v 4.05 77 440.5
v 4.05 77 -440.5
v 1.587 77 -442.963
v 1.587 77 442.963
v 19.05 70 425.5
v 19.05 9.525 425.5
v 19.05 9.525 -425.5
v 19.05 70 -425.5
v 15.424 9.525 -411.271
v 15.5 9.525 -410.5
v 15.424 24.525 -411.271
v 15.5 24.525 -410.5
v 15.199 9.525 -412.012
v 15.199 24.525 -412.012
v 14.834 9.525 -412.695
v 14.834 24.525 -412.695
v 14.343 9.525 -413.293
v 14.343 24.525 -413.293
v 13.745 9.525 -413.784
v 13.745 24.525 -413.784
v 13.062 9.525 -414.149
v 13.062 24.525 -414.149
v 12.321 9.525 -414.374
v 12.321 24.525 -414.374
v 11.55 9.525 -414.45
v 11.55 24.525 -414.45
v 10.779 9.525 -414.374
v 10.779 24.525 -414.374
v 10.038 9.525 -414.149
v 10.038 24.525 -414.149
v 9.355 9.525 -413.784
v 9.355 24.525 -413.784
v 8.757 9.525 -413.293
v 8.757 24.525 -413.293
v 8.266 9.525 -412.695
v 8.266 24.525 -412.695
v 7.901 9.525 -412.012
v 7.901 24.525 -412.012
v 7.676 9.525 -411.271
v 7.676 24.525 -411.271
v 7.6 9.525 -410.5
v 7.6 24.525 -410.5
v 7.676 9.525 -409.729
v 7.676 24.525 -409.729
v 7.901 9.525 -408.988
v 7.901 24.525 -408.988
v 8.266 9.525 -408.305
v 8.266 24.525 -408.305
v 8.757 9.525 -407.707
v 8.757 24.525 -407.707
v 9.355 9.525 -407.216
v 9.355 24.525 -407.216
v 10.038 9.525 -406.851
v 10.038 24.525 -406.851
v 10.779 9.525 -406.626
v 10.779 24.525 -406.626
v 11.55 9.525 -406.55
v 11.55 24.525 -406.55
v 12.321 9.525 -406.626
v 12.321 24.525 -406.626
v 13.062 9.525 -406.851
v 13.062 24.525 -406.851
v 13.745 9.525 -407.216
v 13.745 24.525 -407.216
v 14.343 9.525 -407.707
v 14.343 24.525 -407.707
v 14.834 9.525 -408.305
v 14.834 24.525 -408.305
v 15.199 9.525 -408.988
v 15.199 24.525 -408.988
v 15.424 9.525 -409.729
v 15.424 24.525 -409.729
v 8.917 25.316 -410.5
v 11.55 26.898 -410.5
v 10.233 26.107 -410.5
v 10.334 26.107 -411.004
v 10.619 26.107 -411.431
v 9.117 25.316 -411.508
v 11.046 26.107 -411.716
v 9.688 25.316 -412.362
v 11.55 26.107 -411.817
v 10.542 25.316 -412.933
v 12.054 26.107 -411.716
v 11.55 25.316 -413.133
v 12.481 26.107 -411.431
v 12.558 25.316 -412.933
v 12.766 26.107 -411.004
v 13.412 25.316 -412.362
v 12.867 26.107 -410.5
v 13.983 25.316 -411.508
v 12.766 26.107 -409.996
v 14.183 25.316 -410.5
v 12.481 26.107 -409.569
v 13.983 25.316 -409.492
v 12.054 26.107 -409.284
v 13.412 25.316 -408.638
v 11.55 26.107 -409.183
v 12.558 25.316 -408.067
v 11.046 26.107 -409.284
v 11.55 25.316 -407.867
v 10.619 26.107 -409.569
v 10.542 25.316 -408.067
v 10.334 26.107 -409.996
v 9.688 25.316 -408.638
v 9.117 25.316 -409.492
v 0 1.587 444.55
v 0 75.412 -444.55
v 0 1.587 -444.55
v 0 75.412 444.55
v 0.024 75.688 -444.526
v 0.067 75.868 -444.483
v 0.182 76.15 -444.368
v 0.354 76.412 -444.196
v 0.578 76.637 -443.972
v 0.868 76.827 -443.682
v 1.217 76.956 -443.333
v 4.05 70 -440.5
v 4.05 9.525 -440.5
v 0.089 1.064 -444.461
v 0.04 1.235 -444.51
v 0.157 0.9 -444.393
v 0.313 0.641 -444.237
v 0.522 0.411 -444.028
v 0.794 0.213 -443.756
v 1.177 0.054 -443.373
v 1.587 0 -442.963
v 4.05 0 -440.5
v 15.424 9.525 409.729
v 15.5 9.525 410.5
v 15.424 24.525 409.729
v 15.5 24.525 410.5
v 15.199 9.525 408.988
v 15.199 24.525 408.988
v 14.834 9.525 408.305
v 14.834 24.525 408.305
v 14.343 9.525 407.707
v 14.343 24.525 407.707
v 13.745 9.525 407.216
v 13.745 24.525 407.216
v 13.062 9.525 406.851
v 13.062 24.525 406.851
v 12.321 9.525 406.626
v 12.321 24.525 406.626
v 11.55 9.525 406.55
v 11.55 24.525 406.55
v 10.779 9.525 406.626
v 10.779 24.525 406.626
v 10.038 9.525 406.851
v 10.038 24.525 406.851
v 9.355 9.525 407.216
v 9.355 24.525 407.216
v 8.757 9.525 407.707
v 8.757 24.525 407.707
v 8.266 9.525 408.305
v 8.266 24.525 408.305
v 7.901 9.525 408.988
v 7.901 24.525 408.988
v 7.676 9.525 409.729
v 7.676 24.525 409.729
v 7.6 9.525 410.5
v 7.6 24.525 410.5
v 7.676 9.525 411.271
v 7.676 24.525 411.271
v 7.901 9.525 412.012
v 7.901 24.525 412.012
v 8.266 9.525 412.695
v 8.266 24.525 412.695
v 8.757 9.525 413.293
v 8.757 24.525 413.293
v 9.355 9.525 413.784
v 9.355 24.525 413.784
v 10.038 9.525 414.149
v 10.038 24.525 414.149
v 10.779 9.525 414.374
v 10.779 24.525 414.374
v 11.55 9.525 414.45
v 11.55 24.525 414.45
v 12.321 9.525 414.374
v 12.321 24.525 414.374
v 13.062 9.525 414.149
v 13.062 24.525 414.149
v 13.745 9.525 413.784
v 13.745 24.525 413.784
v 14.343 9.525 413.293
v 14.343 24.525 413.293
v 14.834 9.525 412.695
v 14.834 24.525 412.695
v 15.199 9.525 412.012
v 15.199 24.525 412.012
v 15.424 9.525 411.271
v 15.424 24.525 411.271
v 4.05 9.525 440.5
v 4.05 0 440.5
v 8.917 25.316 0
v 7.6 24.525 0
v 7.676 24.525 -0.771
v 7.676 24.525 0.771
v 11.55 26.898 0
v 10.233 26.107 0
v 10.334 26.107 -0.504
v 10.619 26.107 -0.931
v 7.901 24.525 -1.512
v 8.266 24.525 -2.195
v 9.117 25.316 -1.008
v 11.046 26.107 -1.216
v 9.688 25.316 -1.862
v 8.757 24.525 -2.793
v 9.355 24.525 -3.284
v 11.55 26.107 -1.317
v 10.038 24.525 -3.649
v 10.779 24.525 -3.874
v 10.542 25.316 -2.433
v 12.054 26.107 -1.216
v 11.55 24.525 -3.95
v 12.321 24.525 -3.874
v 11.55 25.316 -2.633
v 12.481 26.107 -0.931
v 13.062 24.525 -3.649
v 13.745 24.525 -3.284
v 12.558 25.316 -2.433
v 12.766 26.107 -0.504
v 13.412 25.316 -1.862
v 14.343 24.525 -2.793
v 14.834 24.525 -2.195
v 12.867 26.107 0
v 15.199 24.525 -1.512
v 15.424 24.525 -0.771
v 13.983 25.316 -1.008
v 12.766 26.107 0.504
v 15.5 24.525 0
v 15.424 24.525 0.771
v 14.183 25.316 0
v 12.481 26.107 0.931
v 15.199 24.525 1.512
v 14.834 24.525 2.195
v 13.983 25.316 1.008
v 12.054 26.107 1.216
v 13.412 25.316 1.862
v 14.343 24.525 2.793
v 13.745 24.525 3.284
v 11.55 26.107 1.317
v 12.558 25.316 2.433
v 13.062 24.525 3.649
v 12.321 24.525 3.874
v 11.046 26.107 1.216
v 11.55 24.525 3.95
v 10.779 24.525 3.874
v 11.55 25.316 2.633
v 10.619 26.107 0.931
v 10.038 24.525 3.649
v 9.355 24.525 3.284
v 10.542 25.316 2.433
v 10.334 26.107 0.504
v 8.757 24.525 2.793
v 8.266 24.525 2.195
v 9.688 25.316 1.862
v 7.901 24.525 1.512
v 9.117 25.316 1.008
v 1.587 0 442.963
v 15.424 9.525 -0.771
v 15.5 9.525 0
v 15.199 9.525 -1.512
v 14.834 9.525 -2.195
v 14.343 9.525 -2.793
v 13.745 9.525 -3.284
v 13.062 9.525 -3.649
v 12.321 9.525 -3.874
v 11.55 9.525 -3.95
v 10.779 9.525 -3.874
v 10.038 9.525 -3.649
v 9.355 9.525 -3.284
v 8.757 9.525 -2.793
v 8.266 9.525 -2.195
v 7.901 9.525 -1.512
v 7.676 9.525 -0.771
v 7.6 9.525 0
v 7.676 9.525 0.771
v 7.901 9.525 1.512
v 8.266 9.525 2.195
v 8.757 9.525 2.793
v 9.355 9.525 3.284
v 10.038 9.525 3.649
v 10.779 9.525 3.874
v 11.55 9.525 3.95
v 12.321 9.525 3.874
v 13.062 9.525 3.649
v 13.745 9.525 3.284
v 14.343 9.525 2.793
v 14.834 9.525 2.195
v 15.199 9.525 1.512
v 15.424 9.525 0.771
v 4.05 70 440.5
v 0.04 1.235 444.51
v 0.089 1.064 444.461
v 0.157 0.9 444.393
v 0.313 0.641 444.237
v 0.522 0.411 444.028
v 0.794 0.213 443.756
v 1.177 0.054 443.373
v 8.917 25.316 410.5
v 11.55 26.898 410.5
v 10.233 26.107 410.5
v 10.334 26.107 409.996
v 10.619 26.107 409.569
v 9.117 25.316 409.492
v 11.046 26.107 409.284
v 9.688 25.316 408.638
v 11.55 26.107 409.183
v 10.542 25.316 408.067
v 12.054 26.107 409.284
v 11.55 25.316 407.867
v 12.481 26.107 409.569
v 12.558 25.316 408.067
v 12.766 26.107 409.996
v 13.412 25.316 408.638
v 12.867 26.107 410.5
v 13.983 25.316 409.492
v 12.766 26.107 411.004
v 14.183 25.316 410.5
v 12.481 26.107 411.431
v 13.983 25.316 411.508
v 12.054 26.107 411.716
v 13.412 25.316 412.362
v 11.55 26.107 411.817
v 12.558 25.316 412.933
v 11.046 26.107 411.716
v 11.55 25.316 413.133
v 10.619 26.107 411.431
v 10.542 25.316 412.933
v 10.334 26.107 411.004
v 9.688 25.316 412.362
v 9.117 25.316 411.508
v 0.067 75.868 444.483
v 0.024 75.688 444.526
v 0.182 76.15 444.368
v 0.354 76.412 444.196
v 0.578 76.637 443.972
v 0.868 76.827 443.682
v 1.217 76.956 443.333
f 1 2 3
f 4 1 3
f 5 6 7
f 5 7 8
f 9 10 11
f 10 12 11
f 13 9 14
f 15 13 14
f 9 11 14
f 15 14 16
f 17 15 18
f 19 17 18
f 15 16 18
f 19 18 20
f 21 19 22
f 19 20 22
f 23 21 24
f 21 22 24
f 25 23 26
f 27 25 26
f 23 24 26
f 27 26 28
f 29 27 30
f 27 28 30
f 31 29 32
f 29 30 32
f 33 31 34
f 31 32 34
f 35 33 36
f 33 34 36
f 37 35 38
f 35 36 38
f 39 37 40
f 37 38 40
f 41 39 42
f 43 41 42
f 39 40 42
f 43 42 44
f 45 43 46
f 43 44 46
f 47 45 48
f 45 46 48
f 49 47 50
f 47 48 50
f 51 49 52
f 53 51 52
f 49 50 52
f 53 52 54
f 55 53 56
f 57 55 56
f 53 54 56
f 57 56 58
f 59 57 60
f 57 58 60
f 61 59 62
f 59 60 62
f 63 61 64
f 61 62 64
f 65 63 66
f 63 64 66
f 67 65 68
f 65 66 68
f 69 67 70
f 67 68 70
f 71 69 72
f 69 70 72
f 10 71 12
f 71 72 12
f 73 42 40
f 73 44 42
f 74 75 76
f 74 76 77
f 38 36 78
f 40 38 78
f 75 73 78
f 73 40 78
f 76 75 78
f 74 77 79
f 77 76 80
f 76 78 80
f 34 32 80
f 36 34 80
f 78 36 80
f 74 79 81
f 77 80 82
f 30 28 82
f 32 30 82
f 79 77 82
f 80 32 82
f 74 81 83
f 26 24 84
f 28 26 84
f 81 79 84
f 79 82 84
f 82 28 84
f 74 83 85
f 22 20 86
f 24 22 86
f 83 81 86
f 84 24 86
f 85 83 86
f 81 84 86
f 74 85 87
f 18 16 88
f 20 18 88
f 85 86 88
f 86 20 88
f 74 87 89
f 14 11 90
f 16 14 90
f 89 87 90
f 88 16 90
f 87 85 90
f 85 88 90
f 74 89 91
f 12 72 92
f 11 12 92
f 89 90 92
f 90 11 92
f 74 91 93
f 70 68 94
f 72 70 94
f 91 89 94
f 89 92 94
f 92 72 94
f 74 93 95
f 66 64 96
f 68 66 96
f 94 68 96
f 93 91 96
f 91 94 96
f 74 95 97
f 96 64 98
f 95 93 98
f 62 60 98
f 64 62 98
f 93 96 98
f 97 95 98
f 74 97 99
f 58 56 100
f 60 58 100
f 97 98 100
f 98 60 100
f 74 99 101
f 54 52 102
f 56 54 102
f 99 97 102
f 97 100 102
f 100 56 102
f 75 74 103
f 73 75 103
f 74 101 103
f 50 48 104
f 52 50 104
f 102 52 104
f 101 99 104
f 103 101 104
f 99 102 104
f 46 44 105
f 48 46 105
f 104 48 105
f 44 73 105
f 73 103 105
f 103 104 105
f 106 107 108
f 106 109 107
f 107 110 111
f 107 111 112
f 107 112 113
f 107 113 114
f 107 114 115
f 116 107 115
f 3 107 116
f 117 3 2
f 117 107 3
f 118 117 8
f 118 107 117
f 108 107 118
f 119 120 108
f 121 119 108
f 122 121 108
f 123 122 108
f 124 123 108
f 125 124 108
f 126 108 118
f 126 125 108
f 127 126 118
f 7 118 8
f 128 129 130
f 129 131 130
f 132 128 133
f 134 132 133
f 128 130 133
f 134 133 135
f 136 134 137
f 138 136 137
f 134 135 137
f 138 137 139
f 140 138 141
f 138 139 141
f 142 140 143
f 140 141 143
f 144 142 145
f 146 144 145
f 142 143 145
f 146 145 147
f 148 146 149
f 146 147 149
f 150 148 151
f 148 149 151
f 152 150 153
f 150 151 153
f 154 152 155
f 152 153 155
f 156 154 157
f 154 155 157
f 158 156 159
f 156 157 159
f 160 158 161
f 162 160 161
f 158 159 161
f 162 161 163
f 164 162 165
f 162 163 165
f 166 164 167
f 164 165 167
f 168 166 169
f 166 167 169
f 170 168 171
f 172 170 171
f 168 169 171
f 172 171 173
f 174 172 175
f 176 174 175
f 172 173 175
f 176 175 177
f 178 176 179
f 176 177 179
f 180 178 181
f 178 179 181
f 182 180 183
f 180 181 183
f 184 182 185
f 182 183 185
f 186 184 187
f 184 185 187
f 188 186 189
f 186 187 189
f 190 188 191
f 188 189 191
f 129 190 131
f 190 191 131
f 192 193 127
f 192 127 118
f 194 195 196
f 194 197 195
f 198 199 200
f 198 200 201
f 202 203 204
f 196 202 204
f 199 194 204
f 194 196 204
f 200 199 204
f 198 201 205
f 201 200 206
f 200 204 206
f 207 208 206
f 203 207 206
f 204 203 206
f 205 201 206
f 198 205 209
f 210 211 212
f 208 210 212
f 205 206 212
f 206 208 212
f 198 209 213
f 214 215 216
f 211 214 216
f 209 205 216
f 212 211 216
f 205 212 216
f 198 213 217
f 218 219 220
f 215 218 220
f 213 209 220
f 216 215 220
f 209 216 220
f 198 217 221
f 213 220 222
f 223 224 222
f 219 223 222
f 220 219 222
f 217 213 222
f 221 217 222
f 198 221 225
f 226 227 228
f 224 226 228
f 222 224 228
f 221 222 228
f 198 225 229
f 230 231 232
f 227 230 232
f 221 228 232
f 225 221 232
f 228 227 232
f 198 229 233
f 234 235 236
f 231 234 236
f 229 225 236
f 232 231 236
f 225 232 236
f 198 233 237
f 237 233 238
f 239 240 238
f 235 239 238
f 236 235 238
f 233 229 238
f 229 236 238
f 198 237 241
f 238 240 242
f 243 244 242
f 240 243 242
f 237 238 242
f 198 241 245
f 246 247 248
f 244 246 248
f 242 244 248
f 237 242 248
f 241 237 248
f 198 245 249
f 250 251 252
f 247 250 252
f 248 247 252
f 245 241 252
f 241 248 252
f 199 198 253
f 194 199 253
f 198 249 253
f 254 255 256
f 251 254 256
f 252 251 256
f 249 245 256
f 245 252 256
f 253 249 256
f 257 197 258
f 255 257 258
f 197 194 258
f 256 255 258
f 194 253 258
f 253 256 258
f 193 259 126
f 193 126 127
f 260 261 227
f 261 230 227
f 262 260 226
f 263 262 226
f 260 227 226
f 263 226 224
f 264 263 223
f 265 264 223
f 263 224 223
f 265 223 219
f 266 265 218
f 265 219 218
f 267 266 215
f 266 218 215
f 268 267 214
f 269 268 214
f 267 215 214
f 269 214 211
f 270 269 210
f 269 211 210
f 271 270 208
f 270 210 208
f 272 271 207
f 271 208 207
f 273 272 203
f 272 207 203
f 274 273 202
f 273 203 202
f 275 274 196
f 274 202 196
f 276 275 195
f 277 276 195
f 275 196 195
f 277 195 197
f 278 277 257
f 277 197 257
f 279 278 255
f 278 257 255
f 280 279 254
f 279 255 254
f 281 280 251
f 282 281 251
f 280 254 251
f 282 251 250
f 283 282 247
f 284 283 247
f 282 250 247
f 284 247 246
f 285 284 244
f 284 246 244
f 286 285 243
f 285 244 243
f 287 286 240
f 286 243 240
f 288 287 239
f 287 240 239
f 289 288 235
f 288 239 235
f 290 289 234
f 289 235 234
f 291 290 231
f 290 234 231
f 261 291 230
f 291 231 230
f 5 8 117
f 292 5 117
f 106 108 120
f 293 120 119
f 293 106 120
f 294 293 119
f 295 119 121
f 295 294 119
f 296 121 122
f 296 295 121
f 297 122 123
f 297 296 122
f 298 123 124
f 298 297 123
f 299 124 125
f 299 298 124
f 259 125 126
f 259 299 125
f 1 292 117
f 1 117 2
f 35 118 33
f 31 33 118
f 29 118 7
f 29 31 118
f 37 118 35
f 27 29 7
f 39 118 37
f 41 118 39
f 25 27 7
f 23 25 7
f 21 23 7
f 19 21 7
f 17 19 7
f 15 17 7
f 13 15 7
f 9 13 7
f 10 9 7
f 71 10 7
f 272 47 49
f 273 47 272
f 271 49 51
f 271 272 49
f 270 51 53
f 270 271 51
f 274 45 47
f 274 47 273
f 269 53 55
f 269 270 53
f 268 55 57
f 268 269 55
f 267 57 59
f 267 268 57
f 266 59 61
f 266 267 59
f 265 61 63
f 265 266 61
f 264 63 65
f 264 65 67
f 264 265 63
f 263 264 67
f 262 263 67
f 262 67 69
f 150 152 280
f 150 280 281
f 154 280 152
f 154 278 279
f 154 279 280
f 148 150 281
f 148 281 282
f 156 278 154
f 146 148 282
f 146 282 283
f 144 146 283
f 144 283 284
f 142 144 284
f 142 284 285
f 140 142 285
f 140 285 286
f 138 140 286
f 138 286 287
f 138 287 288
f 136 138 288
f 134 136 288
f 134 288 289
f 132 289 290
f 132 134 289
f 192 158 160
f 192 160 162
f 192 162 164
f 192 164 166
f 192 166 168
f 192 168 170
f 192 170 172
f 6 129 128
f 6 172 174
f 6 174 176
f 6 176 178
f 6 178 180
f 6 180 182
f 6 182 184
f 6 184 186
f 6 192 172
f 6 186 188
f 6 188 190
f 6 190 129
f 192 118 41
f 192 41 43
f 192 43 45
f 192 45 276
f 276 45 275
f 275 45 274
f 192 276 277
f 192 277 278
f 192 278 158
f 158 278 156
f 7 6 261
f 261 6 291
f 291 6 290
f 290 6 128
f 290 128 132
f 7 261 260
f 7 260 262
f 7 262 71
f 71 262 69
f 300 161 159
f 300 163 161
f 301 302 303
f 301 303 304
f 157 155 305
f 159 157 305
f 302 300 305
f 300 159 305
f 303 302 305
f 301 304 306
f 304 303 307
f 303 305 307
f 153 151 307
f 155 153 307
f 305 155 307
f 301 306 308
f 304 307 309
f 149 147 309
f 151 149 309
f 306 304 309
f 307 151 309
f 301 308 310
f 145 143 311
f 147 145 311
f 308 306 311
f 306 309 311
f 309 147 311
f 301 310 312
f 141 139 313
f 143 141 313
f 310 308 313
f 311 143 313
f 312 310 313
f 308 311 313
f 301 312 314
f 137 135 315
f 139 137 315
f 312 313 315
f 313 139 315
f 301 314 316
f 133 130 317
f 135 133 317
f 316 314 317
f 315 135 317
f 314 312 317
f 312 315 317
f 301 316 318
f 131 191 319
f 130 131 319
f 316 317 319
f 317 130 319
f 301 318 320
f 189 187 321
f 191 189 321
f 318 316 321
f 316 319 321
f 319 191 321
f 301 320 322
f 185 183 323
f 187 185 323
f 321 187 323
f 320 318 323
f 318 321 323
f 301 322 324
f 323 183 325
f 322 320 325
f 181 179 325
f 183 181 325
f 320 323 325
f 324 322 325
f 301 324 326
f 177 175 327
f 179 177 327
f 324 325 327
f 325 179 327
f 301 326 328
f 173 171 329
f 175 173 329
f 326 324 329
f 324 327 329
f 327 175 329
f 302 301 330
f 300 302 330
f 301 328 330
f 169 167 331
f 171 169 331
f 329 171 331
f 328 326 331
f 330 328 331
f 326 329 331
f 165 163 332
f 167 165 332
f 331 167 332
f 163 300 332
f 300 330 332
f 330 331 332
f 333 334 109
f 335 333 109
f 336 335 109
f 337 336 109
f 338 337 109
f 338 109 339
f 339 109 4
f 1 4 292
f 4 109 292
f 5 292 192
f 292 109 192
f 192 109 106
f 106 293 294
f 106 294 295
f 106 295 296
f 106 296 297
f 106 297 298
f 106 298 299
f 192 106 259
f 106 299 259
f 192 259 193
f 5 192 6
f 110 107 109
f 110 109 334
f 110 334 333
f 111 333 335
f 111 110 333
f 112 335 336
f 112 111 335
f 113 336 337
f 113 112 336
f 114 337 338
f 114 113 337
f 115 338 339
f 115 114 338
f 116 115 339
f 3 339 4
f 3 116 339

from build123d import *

# Parameters (mm, degrees)
BOSS_EXTRUDE1_DEPTH            = 444.55
FILLET1_R                      = 1.5875
CUT_EXTRUDE1_DEPTH             = 452.571262372
CUT_EXTRUDE1_DEPTH_BACK        = 452.571262372
F_7_9_7_9_DIAMETER_HOLE1_D     = 7.9
F_7_9_7_9_DIAMETER_HOLE1_DEPTH = 15
F_7_9_7_9_DIAMETER_HOLE1_TIP   = 2.373399445


with BuildPart() as part:
    # Sketch1 → Boss-Extrude1 (new, symmetric)
    with BuildSketch(Plane.XY):
        Polygon((0, 77), (0, 0), (4.05, 0), (4.05, 9.525), (19.05, 9.525), (19.05, 70), (4.05, 70), (4.05, 77), align=None)
    extrude(amount=BOSS_EXTRUDE1_DEPTH, both=True)

    # Fillet1
    fillet1_edges = [part.edges().sort_by_distance(p)[0] for p in [
        (0, 0, 0),
        (0, 77, 0),
    ]]
    fillet(fillet1_edges, radius=FILLET1_R)

    # Sketch2 → Cut-Extrude1 (cut, two sides: drawn at the far end of the back side and taken through both)
    with BuildSketch(Plane(origin=(0, 77, 0), x_dir=(1, 0, 0), z_dir=(0, 1, 0)).offset(-CUT_EXTRUDE1_DEPTH_BACK)):
        Polygon((0, -444.55), (19.05, -425.5), (19.05, -444.55), align=None)
        Polygon((0, 444.55), (19.05, 425.5), (19.05, 444.55), align=None)
    extrude(amount=CUT_EXTRUDE1_DEPTH + CUT_EXTRUDE1_DEPTH_BACK, mode=Mode.SUBTRACT)

    # Ø7.9 (7.9) Diameter Hole1
    with Locations(Plane(origin=(0, 9.525, 0), x_dir=(-1, 0, 0), z_dir=(0, -1, 0))):
        with Locations((-11.55, -410.5), (-11.55, 410.5), (-11.55, 0)):
            Hole(F_7_9_7_9_DIAMETER_HOLE1_D / 2, depth=F_7_9_7_9_DIAMETER_HOLE1_DEPTH)
            with Locations((0, 0, -(F_7_9_7_9_DIAMETER_HOLE1_DEPTH + F_7_9_7_9_DIAMETER_HOLE1_TIP / 2))):  # 118° drill point
                Cone(0, F_7_9_7_9_DIAMETER_HOLE1_D / 2, F_7_9_7_9_DIAMETER_HOLE1_TIP, mode=Mode.SUBTRACT)


solid = part.part
